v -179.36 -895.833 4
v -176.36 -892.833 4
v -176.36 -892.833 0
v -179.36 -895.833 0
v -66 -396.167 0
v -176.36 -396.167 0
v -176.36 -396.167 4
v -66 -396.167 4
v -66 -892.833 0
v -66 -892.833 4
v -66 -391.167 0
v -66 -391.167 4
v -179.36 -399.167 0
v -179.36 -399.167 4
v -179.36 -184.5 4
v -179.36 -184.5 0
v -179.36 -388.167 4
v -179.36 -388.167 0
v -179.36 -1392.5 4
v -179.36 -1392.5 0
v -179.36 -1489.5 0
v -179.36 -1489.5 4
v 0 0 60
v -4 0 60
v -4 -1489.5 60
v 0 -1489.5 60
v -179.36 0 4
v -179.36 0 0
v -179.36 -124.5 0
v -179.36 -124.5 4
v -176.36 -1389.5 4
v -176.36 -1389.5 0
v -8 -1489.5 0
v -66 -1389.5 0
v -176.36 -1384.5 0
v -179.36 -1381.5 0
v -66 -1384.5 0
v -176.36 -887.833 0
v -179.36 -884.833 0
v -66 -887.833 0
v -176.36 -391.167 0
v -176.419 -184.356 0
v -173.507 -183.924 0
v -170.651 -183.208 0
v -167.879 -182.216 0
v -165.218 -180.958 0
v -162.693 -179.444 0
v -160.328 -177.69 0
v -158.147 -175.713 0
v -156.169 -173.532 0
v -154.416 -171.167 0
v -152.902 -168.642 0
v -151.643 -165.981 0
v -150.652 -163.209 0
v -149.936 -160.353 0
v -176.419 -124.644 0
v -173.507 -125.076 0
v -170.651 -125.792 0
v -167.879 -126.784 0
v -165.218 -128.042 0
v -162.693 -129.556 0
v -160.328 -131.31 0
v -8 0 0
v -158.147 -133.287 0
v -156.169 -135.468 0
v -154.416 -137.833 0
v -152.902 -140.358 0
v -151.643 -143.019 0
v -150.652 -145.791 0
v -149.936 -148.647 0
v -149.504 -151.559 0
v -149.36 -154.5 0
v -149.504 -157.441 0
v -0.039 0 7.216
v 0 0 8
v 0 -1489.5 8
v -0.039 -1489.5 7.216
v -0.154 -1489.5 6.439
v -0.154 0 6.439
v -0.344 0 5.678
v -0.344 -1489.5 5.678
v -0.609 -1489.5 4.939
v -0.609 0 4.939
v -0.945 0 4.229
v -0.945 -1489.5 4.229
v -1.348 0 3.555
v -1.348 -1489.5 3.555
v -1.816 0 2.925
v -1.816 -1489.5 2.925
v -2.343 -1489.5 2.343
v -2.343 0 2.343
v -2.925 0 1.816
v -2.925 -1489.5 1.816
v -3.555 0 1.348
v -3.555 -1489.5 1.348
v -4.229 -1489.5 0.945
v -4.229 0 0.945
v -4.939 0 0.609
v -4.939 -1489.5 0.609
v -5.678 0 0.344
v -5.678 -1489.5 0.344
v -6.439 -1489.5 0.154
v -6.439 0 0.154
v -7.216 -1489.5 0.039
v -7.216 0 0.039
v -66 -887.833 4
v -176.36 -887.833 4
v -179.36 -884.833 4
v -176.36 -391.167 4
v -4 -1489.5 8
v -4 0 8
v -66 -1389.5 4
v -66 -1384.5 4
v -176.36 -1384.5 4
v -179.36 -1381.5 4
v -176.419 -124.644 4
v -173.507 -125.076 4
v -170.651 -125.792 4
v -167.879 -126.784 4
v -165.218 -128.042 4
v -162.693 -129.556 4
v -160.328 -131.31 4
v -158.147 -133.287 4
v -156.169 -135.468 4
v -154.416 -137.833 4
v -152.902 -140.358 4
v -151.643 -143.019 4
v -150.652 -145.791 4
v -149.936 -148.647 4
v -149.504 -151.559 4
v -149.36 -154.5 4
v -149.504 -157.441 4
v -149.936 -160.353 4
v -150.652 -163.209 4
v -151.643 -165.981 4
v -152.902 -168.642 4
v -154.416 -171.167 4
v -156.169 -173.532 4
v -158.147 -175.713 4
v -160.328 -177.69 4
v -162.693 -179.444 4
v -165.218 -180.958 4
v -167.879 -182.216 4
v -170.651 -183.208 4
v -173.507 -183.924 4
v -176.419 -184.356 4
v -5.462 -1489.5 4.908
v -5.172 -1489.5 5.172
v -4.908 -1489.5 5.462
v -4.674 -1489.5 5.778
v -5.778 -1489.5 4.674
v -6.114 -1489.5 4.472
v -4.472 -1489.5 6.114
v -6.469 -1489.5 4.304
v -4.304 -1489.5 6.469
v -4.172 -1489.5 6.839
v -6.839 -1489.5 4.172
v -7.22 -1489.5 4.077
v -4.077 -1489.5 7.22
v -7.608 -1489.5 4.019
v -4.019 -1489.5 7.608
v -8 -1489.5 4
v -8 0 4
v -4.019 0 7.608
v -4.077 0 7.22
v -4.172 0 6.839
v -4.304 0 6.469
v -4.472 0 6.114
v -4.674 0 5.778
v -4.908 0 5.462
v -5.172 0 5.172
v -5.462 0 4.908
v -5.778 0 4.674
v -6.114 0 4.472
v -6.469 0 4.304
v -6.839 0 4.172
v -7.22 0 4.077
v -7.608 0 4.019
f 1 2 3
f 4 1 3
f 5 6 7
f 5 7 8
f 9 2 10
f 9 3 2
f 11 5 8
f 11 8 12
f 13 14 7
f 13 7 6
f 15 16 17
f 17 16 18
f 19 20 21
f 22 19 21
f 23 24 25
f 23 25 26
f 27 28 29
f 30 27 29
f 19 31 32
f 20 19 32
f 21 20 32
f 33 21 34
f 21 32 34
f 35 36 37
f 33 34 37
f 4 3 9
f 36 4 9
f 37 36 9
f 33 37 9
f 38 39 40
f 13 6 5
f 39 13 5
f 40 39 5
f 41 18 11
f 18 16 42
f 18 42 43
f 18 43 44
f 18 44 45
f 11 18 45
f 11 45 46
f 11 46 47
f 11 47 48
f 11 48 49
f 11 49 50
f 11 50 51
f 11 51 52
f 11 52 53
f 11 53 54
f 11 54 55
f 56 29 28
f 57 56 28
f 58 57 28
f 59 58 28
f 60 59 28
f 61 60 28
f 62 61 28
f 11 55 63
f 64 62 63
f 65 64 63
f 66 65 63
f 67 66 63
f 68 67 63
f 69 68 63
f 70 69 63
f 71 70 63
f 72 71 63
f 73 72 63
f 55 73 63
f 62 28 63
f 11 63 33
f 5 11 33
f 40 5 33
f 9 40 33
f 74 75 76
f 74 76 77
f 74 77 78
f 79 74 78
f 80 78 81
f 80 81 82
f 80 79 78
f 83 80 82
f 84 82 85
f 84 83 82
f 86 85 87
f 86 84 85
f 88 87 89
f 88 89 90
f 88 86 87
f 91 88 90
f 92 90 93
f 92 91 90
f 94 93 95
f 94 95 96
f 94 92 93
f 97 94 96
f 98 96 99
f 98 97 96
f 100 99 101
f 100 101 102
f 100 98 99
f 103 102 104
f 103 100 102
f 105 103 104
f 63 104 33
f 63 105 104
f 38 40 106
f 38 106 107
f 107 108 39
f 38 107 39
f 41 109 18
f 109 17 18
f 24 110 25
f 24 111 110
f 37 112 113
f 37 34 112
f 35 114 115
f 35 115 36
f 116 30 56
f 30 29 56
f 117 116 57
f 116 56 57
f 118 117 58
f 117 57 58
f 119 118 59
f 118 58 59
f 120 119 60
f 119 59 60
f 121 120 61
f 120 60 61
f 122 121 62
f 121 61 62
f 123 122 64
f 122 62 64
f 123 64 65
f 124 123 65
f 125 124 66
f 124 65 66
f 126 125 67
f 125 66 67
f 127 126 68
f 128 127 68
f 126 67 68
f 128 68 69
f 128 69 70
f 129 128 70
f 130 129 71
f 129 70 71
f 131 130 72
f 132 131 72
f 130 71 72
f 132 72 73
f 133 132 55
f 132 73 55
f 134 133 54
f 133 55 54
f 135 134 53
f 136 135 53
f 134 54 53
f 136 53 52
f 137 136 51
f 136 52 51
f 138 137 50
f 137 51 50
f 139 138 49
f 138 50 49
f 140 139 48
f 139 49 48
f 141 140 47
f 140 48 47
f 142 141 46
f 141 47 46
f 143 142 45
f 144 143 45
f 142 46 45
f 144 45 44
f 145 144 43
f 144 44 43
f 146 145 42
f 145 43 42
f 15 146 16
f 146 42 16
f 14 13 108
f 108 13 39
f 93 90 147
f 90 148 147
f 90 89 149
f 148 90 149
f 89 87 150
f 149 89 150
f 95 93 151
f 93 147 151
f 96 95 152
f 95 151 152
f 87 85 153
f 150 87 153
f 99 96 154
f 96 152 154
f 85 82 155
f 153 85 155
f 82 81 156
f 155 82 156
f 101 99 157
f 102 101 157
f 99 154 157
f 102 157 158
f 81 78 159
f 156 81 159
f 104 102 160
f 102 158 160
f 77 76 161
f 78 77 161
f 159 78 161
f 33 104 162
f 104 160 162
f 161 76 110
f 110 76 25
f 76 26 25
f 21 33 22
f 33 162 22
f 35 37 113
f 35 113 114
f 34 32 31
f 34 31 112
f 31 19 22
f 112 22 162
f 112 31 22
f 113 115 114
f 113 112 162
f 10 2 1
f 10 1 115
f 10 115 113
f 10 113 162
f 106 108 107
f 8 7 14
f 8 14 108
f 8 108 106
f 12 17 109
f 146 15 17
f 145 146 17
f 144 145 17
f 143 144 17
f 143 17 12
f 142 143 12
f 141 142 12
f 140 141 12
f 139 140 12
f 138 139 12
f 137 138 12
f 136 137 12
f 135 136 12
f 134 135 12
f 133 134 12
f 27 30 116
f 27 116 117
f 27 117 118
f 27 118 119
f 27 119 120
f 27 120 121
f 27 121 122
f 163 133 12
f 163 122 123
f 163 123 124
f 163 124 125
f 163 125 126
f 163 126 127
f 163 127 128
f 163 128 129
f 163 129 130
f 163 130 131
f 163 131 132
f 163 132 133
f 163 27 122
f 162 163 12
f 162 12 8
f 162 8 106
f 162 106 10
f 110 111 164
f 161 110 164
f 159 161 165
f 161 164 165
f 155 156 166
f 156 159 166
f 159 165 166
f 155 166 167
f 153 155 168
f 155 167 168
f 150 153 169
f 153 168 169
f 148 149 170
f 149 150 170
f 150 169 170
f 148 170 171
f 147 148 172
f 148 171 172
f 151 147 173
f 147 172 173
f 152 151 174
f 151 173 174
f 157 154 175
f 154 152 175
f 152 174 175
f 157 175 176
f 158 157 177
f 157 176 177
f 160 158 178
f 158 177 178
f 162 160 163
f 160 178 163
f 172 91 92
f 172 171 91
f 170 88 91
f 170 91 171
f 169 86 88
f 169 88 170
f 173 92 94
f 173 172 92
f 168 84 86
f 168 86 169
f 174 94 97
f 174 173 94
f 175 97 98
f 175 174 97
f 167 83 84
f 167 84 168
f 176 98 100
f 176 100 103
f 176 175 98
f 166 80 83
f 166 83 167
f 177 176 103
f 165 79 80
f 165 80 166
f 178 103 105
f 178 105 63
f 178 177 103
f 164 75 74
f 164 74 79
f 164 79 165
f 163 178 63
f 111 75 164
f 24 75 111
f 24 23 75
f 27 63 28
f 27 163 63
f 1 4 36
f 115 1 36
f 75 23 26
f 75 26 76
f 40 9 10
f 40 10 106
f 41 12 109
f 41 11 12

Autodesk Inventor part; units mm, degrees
ref_plane "YZ Plane" through (0, 0, 0) normal (1, 0, 0) x (0, 1, 0)
ref_plane "XZ Plane" through (0, 0, 0) normal (0, 1, 0) x (-1, 0, 0)
ref_plane "XY Plane" through (0, 0, 0) normal (0, 0, 1) x (1, 0, 0)
sketch "Sketch1" plane through (0, 0, 0) normal (0, 0, 1) x (1, 0, 0)
  line L0 (0, 0) -> (-179.3598, 0)
  line L1 (-179.3598, 0) -> (-179.3598, -1489.5)
  line L2 (-179.3598, -1489.5) -> (0, -1489.5)
  line L3 (0, -1489.5) -> (0, 0)
  line L4 (-179.3598, -1389.5) -> (-66, -1389.5)
  line L5 (-66, -1389.5) -> (-66, -1384.5)
  line L6 (-66, -1384.5) -> (-179.3598, -1384.5)
  line L7 (-179.3598, -1384.5) -> (-179.3598, -1389.5)
  line L8 (-179.3598, -892.8333) -> (-66, -892.8333)
  line L9 (-66, -892.8333) -> (-66, -887.8333)
  line L10 (-66, -887.8333) -> (-179.3598, -887.8333)
  line L11 (-179.3598, -887.8333) -> (-179.3598, -892.8333)
  line L12 (-179.3598, -396.1667) -> (-66, -396.1667)
  line L13 (-66, -396.1667) -> (-66, -391.1667)
  line L14 (-66, -391.1667) -> (-179.3598, -391.1667)
  line L15 (-179.3598, -391.1667) -> (-179.3598, -396.1667)
  circle A0 centre (-179.3598, -154.5) radius 30
  point P0 (-179.3598, -396.1667)
  point P1 (-179.3598, -124.5)
  point P2 (-179.3598, -184.5)
  dimension "d0" = 1489.5
  dimension "d1" = 179.3598
  dimension "d2" = 5
  dimension "d4" = 100
  dimension "d7" = 496.6667
  dimension "d23" = 66
  dimension "d28" = 60
  dimension "d30" = 1335
extrude "Plate1" add sketch "Sketch1" along normal blind 4 contours L3 L2 L1 L4 L5 L6 L8 L9 L10 L12 L13 L14 A0 L0
sketch "Sketch2" plane through (-4, 0, 0) normal (1, 0, 0) x (0, 1, 0)
  line L0 (-1489.5, 0) -> (0, 0)
  line L1 (0, 0) -> (0, 60)
  line L2 (0, 60) -> (-1489.5, 60)
  line L3 (-1489.5, 60) -> (-1489.5, 0)
edge flange "Flange1" height 60 angle 90 thickness 4 bend radius 4 thickness toward (1, 0, 0) relief tear relief width 4 relief depth 2 edges at (0, -744.75, 4) wall of the first edge with corners at (-4, -1489.5, 0) (-4, 0, 0) (-4, 0, 60) (-4, -1489.5, 60)
bend "Bend1"
corner "Corner1"
chamfer "Corner Chamfer1" distance 3 angle 45 6 edges at (-179.3598, -1389.5, 2) (-179.3598, -1384.5, 2) (-179.3598, -892.8333, 2) (-179.3598, -887.8333, 2) (-179.3598, -391.1667, 2) (-179.3598, -396.1667, 2)
equation "\"d0\" = Стрингер_длина"
equation "\"d1\" = стрингер_глубина_2"
equation "\"d2\" = паз_под_стрингер_толщина"
equation "\"d7\" = Шаг_шпангоутов"
equation "\"d23\" = паз_под_стрингер_глубина - Thickness"
equation "\"d28\" = 2 * радиус_выреза_под_сварку"
equation "\"d12\" = Thickness"
equation "\"d13\" = BendReliefWidth"
equation "\"d14\" = BendReliefDepth"
equation "\"d15\" = MinimumRemnant"
equation "\"d16\" = TransitionRadius"
equation "\"d17\" = ребро_усилителей"
equation "\"d19\" = BendRadius"
equation "\"d20\" = CornerReliefSize"
equation "\"d21\" = GapSize"
equation "\"d22\" = JacobiRadiusSize"
equation "\"BendRadius\" = Thickness"
equation "\"BendReliefWidth\" = Thickness"
equation "\"BendReliefDepth\" = 0.5 * Thickness"
equation "\"CornerReliefSize\" = 4 * Thickness"
equation "\"MinimumRemnant\" = 2 * Thickness"
equation "\"TransitionRadius\" = BendRadius"
equation "\"JacobiRadiusSize\" = BendRadius"
equation "\"GapSize\" = Thickness"
equation "\"Стрингер_длина\" = 1489.5"
equation "\"стрингер_глубина_2\" = 179.359772"
equation "\"паз_под_стрингер_толщина\" = 5"
equation "\"Шаг_шпангоутов\" = 496.666667"
equation "\"паз_под_стрингер_глубина\" = 70"
equation "\"Thickness\" = 4"
equation "\"радиус_выреза_под_сварку\" = 30"
equation "\"ребро_усилителей\" = 60"
properties part number "GBK 0103 stringer 2" material "Steel"
